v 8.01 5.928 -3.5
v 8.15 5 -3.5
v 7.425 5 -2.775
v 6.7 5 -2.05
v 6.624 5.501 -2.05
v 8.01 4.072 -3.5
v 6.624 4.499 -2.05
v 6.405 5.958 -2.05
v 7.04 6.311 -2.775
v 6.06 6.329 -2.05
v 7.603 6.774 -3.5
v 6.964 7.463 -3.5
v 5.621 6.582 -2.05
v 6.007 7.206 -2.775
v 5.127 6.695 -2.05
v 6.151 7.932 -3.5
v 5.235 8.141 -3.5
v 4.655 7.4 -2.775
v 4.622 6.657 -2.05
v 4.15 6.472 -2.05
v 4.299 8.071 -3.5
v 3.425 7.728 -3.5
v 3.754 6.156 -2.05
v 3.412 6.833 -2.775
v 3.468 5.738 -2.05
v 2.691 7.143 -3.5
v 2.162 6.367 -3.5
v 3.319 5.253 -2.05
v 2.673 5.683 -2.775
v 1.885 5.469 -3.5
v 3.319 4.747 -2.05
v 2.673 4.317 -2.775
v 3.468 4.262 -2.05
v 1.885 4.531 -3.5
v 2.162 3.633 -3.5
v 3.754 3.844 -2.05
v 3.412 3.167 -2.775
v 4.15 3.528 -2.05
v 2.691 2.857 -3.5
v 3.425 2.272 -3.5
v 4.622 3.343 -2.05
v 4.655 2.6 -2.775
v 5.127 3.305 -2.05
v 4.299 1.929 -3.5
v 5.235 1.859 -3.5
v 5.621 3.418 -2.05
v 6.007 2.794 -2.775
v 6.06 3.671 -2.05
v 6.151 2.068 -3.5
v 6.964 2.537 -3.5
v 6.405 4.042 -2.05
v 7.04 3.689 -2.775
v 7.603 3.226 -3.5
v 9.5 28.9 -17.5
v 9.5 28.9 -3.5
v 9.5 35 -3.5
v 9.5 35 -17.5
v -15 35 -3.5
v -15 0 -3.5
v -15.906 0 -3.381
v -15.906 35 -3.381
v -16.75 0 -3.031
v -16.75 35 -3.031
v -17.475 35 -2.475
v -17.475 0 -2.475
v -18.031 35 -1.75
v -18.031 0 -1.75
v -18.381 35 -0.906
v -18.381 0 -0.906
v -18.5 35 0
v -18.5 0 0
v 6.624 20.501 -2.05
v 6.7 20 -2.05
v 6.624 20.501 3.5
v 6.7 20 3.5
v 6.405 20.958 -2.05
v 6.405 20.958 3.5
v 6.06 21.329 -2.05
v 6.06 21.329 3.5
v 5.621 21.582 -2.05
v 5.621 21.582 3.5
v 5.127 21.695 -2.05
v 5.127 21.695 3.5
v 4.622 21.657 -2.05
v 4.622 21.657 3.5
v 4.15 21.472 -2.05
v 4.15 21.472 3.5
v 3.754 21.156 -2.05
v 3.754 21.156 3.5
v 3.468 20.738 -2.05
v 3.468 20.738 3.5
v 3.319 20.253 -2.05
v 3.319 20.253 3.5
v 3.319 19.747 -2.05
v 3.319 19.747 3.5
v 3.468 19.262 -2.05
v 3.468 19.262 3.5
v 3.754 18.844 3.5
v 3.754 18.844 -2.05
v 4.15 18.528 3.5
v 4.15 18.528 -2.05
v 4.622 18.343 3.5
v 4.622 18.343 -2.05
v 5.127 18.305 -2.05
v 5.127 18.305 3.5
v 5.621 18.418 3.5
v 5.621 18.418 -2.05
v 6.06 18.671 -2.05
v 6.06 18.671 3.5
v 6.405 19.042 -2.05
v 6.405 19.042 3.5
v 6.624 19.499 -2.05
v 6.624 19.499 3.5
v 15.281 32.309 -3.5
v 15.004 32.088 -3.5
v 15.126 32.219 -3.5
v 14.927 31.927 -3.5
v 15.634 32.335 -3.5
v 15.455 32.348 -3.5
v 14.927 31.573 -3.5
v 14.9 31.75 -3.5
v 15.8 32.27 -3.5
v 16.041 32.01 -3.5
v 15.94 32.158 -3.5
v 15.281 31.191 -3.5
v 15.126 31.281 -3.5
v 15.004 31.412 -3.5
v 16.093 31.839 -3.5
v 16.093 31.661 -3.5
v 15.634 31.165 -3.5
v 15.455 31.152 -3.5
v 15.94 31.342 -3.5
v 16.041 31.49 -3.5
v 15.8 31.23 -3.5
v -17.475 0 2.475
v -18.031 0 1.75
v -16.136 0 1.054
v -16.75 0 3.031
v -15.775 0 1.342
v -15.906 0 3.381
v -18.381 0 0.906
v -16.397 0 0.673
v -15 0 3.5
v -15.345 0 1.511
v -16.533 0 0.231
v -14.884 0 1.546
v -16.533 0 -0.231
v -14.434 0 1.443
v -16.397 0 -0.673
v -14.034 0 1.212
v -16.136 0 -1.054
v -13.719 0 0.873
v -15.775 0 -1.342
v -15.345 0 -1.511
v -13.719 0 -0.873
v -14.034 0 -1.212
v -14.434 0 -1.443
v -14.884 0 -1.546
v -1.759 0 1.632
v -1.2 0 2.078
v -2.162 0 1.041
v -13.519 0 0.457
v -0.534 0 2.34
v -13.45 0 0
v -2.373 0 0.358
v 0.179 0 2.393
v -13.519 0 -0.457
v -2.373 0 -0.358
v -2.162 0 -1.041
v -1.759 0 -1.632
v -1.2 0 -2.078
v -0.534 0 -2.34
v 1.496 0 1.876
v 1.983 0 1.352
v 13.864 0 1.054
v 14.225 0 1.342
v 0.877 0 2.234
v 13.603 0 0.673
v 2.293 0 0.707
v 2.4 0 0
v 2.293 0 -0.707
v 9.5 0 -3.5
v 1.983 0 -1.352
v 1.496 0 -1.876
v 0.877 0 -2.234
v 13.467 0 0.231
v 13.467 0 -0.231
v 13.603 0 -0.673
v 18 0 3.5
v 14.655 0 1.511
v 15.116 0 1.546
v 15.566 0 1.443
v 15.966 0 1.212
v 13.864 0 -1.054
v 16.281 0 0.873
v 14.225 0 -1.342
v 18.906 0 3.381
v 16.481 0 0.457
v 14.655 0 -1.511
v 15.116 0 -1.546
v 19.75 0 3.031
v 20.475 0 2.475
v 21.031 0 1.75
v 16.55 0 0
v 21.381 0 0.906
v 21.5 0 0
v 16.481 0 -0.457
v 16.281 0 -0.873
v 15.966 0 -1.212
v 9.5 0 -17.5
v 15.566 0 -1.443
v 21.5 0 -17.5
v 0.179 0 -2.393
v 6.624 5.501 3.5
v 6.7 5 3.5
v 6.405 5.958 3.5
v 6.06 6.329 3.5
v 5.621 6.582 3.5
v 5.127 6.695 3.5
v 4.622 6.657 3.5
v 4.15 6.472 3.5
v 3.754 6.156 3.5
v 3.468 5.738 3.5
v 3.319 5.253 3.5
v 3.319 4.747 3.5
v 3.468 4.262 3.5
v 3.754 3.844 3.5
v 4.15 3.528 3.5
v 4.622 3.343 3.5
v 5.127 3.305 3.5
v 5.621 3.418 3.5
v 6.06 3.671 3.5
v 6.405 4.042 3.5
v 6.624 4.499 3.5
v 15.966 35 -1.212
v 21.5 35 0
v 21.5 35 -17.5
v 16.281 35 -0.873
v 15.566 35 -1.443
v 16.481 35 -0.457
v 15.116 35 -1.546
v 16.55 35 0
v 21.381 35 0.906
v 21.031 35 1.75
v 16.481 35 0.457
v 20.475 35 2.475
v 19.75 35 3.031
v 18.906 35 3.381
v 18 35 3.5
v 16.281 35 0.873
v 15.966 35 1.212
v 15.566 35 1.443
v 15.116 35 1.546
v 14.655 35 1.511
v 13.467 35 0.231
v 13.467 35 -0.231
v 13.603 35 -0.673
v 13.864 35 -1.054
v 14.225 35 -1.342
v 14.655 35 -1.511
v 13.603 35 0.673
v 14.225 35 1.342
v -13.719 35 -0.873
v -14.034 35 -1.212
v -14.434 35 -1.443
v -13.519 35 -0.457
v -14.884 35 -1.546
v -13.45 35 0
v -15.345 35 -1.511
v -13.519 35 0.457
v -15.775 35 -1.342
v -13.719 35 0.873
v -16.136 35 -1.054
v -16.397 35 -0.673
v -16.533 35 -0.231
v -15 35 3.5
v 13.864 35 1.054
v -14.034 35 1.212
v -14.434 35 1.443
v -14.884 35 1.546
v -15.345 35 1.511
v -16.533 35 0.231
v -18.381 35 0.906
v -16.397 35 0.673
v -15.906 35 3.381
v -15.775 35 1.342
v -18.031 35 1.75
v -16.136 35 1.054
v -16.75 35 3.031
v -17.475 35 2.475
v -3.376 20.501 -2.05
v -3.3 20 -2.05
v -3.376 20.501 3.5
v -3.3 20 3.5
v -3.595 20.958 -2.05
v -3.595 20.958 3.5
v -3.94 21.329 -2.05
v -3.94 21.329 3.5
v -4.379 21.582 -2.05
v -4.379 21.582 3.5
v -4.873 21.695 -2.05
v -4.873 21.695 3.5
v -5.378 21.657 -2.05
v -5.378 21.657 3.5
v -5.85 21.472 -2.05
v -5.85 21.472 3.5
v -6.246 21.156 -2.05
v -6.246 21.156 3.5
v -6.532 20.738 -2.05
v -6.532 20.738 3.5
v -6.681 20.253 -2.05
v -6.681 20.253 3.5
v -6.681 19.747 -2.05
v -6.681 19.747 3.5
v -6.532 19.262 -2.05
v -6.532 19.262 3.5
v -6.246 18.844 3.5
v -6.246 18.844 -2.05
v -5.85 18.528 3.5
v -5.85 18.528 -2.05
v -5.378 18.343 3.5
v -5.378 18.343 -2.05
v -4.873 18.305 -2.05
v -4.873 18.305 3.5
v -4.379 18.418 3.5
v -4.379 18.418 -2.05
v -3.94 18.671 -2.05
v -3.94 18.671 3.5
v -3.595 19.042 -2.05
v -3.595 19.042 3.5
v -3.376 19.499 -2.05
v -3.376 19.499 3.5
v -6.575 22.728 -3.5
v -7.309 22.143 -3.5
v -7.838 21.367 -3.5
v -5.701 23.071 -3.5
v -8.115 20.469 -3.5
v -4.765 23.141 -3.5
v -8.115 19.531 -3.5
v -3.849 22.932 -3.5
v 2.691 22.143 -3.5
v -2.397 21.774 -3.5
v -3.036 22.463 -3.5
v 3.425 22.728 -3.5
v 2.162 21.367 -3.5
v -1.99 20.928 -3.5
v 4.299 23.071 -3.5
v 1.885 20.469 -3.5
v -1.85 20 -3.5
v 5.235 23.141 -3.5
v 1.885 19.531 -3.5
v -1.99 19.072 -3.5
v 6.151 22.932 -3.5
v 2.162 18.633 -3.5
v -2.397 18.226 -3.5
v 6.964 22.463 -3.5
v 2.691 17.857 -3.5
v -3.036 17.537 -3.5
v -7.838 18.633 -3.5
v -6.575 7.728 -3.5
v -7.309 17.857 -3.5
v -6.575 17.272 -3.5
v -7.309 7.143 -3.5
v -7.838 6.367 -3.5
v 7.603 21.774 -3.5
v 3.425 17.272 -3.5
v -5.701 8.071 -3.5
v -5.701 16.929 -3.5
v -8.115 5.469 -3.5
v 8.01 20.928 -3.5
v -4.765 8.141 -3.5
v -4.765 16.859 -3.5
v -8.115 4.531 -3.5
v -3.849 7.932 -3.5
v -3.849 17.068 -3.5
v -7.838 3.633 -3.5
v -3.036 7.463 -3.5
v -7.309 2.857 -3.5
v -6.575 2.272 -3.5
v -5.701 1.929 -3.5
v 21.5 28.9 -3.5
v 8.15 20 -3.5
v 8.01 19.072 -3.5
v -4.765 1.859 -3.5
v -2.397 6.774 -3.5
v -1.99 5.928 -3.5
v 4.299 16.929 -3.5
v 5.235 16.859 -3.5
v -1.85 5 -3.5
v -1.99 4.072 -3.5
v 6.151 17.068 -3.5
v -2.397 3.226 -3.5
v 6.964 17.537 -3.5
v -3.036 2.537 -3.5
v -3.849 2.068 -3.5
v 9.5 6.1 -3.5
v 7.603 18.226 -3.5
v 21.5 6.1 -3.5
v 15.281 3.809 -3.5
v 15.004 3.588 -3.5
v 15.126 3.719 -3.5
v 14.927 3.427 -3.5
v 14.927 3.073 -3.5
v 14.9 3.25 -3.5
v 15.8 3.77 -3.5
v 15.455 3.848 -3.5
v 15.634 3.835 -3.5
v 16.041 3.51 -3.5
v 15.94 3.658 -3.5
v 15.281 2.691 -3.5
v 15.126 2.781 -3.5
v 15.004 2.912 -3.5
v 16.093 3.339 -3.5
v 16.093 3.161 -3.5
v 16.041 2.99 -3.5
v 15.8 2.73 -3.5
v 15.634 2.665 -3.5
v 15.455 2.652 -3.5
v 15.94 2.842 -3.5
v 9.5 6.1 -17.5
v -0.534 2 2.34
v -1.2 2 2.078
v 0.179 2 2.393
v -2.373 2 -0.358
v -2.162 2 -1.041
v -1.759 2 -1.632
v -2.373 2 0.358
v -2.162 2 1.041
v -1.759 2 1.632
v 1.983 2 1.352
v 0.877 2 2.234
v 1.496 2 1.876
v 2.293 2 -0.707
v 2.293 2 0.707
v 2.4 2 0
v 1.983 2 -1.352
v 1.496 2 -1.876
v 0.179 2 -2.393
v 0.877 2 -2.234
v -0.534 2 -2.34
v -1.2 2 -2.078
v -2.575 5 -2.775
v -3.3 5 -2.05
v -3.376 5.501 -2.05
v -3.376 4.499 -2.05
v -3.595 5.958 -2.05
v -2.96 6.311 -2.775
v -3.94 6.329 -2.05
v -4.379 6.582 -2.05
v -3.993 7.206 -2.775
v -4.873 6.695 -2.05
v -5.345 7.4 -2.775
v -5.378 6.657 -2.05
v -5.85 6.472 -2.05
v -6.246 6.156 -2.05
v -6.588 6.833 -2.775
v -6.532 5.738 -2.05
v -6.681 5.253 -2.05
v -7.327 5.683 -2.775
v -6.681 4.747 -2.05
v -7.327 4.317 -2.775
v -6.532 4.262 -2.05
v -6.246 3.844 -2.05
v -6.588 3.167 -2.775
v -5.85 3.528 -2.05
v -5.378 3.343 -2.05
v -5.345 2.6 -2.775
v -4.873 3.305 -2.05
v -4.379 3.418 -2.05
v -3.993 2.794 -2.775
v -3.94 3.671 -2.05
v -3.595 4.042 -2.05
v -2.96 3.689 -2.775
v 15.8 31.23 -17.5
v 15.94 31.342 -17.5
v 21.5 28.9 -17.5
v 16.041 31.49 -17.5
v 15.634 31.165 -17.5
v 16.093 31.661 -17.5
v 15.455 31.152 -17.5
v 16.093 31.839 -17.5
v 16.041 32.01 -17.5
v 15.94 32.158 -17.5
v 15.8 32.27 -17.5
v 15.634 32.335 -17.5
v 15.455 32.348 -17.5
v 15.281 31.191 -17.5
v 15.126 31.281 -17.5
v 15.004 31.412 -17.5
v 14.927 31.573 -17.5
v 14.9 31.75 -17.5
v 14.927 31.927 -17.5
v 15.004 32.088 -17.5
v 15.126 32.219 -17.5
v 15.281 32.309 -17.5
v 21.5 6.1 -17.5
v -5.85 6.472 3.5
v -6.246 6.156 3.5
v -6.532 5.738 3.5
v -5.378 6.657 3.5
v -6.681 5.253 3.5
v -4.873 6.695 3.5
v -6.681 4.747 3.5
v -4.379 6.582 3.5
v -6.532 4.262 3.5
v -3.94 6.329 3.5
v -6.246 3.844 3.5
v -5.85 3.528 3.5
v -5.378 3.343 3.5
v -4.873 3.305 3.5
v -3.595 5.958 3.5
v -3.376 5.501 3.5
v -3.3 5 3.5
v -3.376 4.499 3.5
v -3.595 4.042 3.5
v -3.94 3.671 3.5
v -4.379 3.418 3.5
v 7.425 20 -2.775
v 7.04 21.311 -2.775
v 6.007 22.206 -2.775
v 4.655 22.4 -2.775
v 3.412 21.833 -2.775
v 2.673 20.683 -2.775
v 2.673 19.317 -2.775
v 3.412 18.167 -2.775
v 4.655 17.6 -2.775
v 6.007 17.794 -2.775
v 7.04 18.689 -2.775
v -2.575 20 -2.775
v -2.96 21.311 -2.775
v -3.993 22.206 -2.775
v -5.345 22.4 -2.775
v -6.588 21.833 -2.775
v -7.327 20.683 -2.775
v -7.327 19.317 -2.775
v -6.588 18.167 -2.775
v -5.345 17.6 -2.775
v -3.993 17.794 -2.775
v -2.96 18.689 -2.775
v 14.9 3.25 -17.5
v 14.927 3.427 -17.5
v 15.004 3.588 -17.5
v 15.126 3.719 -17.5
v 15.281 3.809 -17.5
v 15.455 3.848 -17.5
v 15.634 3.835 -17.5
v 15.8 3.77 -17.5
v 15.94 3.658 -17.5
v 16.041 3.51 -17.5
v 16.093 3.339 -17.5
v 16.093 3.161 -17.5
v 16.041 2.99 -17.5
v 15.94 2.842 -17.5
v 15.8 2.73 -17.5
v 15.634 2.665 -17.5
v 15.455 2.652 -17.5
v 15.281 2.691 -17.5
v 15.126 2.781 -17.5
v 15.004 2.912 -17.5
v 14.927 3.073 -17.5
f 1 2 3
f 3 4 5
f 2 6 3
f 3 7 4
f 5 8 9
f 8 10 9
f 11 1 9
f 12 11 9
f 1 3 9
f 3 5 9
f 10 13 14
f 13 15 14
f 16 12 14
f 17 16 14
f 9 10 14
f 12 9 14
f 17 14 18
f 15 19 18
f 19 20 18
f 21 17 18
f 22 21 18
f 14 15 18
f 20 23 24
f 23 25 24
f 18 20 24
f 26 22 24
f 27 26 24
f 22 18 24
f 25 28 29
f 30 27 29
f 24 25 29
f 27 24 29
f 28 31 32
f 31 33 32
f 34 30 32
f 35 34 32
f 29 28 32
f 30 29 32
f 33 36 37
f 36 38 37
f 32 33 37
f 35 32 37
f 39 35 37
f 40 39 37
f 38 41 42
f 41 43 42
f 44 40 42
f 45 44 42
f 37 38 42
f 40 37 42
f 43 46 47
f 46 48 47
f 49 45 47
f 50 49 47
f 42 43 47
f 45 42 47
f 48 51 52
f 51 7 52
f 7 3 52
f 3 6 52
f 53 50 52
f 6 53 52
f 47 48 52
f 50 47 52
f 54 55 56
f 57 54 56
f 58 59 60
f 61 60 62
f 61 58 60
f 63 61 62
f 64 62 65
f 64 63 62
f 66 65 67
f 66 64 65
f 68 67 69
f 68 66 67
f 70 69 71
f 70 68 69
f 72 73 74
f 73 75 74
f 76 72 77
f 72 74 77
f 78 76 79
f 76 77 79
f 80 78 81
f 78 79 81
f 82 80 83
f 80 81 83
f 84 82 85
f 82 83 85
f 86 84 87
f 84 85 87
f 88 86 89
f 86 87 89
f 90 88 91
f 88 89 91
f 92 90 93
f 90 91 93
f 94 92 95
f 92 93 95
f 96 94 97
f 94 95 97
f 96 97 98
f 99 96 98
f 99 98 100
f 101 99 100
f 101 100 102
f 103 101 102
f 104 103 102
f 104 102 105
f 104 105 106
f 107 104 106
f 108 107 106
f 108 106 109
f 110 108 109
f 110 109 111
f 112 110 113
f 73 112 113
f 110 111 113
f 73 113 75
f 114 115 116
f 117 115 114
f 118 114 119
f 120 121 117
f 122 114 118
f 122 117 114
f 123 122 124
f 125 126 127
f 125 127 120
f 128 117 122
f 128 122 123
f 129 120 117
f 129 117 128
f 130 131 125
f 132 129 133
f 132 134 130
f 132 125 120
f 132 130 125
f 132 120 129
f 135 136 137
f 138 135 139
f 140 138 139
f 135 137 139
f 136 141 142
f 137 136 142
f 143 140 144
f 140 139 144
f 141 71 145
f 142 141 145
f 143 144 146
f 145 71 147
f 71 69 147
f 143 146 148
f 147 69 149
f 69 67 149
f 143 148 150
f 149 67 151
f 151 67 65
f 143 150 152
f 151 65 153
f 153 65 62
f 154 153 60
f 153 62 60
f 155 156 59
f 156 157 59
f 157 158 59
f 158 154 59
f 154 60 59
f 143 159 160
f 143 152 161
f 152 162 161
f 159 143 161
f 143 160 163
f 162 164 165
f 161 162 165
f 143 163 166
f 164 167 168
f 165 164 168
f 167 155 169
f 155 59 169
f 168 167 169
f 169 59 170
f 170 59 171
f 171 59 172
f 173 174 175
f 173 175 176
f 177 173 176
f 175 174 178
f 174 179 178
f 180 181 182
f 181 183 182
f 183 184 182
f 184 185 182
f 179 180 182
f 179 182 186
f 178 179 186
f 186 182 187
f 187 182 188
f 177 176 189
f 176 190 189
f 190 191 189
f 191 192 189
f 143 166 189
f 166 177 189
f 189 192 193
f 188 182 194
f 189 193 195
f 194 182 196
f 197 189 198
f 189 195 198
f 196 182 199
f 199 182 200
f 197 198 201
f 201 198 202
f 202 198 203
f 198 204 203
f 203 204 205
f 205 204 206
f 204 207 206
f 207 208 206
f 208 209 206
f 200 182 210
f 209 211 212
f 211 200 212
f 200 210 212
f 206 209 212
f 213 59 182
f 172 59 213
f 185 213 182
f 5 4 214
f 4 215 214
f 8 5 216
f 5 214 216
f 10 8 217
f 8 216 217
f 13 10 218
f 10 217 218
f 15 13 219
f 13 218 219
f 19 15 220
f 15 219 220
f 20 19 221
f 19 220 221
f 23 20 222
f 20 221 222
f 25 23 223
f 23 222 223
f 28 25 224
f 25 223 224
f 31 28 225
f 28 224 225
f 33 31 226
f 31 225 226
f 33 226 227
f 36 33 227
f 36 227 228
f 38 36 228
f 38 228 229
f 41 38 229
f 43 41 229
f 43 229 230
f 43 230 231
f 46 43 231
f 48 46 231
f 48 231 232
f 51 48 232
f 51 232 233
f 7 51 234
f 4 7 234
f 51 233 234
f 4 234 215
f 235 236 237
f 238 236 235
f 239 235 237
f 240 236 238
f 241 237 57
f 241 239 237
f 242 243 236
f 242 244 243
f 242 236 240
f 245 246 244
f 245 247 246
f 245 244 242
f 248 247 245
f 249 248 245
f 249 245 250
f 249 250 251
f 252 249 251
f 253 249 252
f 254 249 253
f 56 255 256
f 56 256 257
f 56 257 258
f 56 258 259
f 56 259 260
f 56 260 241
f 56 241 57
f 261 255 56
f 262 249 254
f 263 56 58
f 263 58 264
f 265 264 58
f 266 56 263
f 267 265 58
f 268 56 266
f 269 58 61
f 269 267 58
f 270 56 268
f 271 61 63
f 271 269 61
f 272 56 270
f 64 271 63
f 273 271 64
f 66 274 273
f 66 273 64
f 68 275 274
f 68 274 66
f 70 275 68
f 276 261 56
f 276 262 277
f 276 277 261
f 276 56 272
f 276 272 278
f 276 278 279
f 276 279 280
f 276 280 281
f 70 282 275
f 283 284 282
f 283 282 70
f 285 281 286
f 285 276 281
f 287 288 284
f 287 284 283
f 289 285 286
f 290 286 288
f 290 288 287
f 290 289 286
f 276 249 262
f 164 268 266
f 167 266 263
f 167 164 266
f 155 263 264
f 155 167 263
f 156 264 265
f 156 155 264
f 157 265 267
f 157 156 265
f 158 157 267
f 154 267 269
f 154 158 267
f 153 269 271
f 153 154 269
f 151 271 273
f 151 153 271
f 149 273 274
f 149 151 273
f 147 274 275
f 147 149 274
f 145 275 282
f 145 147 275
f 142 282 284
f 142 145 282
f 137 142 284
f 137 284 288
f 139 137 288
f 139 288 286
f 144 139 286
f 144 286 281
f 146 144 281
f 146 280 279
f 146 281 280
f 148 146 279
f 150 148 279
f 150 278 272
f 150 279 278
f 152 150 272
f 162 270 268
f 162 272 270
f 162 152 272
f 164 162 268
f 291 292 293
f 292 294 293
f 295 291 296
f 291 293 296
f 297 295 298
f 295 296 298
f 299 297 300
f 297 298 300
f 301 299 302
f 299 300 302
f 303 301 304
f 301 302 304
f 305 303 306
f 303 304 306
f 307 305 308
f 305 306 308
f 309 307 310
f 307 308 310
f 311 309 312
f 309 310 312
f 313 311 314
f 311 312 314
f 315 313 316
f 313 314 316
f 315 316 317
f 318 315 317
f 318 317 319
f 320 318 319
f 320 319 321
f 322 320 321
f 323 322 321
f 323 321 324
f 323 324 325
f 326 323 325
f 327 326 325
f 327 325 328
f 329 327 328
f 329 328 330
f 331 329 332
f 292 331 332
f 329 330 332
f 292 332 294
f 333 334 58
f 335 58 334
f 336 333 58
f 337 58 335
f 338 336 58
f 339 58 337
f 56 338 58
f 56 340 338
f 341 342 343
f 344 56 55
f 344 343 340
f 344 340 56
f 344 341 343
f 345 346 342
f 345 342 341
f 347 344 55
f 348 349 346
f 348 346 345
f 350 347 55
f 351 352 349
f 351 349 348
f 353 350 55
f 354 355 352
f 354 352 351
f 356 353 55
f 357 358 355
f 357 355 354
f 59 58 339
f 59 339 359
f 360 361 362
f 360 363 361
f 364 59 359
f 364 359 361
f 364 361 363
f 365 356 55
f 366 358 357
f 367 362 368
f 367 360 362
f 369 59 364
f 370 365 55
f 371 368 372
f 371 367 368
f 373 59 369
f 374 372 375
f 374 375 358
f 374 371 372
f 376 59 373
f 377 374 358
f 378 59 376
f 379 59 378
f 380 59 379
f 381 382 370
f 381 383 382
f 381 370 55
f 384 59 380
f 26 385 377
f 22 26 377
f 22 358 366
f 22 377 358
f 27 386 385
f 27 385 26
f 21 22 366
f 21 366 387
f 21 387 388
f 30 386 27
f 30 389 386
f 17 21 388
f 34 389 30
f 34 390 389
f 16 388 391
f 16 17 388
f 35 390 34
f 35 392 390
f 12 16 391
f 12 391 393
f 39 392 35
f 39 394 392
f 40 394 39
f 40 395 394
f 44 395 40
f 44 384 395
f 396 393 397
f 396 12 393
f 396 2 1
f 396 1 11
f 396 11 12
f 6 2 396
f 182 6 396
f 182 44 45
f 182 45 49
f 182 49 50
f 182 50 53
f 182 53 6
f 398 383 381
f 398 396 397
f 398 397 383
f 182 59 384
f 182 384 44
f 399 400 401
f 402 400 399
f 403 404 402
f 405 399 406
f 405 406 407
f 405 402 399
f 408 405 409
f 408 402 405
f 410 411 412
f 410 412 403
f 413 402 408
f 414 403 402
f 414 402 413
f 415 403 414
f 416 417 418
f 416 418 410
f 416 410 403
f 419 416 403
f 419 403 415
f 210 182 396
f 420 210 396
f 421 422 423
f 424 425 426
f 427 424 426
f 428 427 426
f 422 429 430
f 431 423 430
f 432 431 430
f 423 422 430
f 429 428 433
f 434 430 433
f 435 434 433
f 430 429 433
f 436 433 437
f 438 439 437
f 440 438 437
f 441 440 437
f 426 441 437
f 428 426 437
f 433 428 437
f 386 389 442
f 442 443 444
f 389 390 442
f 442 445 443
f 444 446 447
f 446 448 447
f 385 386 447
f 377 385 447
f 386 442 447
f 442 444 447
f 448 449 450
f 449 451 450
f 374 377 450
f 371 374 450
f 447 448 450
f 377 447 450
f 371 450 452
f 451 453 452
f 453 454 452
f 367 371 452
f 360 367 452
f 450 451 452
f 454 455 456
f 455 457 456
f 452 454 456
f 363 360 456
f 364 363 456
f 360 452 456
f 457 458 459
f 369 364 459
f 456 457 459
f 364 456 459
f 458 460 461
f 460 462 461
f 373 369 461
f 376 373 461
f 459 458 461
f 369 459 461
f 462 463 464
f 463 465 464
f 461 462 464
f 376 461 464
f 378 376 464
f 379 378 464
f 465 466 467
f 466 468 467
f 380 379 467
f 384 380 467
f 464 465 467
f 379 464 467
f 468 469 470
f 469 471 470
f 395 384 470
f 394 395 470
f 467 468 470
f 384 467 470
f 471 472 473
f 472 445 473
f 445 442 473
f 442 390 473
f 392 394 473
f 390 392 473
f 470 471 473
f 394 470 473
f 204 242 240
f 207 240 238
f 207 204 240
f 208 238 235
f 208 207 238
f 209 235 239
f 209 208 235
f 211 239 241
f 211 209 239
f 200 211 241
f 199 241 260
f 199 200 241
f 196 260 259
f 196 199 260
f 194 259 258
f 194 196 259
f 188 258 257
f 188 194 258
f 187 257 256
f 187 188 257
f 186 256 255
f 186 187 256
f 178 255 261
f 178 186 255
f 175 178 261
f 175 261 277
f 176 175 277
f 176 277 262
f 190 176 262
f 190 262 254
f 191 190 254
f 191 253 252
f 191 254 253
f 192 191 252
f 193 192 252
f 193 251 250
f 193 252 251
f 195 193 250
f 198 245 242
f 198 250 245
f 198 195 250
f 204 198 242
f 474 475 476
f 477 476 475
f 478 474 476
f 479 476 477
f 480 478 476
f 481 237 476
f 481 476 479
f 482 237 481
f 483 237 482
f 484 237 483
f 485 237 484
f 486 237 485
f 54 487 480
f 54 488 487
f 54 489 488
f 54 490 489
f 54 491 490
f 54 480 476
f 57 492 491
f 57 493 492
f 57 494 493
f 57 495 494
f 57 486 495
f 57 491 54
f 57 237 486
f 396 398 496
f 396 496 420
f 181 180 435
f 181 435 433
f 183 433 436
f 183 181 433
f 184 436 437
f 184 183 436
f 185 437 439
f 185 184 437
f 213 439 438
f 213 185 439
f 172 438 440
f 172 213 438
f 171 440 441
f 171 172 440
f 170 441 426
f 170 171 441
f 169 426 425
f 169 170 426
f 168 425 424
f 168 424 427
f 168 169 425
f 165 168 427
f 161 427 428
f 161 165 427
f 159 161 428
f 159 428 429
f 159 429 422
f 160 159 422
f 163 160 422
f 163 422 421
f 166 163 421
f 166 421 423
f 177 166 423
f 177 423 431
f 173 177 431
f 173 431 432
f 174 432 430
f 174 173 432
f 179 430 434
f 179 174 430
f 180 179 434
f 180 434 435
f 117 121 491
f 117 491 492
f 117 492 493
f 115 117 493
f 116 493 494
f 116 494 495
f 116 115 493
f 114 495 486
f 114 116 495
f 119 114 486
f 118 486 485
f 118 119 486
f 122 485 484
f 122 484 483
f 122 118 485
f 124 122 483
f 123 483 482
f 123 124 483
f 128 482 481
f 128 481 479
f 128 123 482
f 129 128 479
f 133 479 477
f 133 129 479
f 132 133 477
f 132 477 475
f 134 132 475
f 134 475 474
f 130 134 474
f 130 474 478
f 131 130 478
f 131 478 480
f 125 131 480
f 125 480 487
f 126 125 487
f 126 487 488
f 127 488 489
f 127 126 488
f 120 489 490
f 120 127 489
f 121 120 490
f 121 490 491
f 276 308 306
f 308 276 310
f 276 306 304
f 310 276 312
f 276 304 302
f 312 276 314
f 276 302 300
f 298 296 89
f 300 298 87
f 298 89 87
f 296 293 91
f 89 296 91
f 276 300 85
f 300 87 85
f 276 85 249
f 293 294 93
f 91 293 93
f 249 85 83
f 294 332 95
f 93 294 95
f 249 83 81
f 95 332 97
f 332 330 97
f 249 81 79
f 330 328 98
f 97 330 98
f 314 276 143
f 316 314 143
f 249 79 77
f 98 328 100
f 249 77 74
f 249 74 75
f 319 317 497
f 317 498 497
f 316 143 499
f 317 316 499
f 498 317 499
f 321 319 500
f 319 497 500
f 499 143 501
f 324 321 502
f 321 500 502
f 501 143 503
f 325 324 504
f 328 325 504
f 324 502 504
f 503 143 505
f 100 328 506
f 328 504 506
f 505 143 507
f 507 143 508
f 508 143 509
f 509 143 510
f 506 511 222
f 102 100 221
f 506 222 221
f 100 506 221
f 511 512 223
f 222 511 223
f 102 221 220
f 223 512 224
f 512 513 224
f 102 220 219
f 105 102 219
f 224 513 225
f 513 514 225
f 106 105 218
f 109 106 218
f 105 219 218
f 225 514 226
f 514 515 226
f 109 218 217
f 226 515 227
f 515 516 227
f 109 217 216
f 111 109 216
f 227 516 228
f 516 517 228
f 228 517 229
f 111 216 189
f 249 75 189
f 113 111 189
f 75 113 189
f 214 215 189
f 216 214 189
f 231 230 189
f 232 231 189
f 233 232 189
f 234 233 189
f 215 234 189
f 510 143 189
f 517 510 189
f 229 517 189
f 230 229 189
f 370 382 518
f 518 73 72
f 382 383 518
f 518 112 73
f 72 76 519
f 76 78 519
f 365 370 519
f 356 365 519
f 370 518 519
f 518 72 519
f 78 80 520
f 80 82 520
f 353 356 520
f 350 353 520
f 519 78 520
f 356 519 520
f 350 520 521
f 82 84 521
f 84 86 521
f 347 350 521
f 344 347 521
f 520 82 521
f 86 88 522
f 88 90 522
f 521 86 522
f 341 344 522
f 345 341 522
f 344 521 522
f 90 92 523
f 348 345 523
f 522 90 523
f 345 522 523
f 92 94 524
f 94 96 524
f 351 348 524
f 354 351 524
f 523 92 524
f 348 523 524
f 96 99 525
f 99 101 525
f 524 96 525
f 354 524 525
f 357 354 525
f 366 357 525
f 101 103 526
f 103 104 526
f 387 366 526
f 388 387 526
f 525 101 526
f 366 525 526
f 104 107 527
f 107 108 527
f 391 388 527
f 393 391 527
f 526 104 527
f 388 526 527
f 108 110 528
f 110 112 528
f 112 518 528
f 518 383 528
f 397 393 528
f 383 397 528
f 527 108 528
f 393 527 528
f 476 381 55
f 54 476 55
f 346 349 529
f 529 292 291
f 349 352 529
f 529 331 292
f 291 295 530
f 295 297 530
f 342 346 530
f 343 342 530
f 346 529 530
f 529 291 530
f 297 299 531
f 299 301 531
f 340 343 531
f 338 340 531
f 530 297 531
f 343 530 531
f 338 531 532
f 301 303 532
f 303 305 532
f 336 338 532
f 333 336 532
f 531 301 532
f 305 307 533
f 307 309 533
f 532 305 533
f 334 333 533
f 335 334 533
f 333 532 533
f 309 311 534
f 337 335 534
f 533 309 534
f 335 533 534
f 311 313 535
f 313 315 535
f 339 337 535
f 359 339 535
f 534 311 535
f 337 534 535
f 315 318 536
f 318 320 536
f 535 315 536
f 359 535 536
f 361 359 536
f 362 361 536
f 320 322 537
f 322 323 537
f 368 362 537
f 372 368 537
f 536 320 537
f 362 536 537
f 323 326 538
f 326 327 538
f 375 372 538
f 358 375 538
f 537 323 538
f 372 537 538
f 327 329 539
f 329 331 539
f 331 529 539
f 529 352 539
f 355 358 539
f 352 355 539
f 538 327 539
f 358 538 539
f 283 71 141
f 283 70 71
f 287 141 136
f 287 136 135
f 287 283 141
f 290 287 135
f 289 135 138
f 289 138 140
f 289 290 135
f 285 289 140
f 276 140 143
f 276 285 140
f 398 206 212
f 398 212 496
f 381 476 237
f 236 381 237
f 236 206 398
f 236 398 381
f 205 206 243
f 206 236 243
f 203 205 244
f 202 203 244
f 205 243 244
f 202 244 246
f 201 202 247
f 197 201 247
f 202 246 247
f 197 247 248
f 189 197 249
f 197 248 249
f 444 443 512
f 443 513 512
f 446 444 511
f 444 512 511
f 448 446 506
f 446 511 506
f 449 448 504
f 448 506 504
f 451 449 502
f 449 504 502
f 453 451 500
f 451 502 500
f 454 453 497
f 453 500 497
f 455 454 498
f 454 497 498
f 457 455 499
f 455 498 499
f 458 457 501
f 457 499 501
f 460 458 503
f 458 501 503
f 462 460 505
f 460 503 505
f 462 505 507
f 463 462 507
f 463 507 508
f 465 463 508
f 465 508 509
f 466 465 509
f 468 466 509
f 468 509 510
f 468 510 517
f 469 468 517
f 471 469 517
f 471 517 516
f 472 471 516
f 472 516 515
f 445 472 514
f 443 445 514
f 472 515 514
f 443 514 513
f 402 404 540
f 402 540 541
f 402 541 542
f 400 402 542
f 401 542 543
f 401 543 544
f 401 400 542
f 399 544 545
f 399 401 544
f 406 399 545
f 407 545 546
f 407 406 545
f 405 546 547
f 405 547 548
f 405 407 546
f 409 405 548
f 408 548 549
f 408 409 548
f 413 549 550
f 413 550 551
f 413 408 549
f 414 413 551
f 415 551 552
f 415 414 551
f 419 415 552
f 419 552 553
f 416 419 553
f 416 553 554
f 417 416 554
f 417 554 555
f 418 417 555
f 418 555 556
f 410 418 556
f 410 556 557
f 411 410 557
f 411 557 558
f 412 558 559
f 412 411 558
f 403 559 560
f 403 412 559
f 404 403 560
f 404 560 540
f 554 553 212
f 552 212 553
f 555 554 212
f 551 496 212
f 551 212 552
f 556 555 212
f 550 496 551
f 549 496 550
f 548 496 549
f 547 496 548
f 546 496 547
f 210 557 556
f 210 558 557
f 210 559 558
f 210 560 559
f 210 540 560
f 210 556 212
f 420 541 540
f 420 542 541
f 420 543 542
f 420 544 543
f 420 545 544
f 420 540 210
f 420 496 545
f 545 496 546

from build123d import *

# Parameters (mm, degrees)
SKIZZE1_W                                            = 40
SKIZZE1_H                                            = 7
AUFSATZ_LINEAR_AUSTRAGEN1_DEPTH                      = 35
SKIZZE2_W                                            = 12
SKIZZE2_H                                            = 6.1
SKIZZE2_R                                            = 0.6
AUFSATZ_LINEAR_AUSTRAGEN2_DEPTH                      = 14
FORMSENKUNG_F_R_M3_SENKSCHRAUBE_MIT_SCHL_D           = 3.4
FORMSENKUNG_F_R_M3_SENKSCHRAUBE_MIT_SCHL_CSINK_D     = 6.3
FORMSENKUNG_F_R_M3_SENKSCHRAUBE_MIT_SCHL_CSINK_ANGLE = 90
VERRUNDUNG1_R                                        = 3.5
SCHNITT_LINEAR_AUSTRAGEN1_DEPTH                      = 45.648628198
SCHNITT_LINEAR_AUSTRAGEN2_DEPTH                      = 2


with BuildPart() as part:
    # Skizze1 → Aufsatz-Linear austragen1 (new body)
    with BuildSketch(Plane(origin=(0, 0, 0), x_dir=(1, 0, 0), z_dir=(0, 1, 0))):
        with Locations((1.5, 0)):
            Rectangle(SKIZZE1_W, SKIZZE1_H)
    extrude(amount=AUFSATZ_LINEAR_AUSTRAGEN1_DEPTH)

    # Skizze2 → Aufsatz-Linear austragen2 (add)
    # profile 1 of 2: a face of its own
    with BuildSketch(Plane(origin=(0, 0, -3.5), x_dir=(-1, 0, 0), z_dir=(0, 0, -1))):
        with Locations((-15.5, 31.95)):
            Rectangle(SKIZZE2_W, SKIZZE2_H)
        with Locations((-15.5, 31.75)):
            Circle(SKIZZE2_R, mode=Mode.SUBTRACT)
    # profile 2 of 2: a face of its own
    with BuildSketch(Plane(origin=(0, 0, -3.5), x_dir=(-1, 0, 0), z_dir=(0, 0, -1))):
        with Locations((-15.5, 3.05)):
            Rectangle(SKIZZE2_W, SKIZZE2_H)
        with Locations((-15.5, 3.25)):
            Circle(SKIZZE2_R, mode=Mode.SUBTRACT)
    extrude(amount=AUFSATZ_LINEAR_AUSTRAGEN2_DEPTH)

    # Formsenkung für M3 Senkschraube mit Schlitz/Kreuzschlitz1 (through all)
    with Locations(Plane(origin=(0, 0, -3.5), x_dir=(-1, 0, 0), z_dir=(0, 0, -1))):
        with Locations((-5, 20), (5, 20), (5, 5), (-5, 5)):
            CounterSinkHole(FORMSENKUNG_F_R_M3_SENKSCHRAUBE_MIT_SCHL_D / 2, FORMSENKUNG_F_R_M3_SENKSCHRAUBE_MIT_SCHL_CSINK_D / 2, counter_sink_angle=FORMSENKUNG_F_R_M3_SENKSCHRAUBE_MIT_SCHL_CSINK_ANGLE)

    # Verrundung1
    verrundung1_edges = [part.edges().sort_by_distance(p)[0] for p in [
        (21.5, 17.5, 3.5),
        (-18.5, 17.5, 3.5),
        (-18.5, 17.5, -3.5),
    ]]
    fillet(verrundung1_edges, radius=VERRUNDUNG1_R - 0.0001)  # a hair under: the kernel refuses the full size

    # Skizze1<5> → Schnitt-Linear austragen1 (cut, through all)
    with BuildSketch(Plane(origin=(0, 0, 0), x_dir=(1, 0, 0), z_dir=(0, 1, 0))):
        with BuildLine():
            ThreePointArc((13.45, 0), (15, -1.55), (16.55, 0))
            Line((16.55, 0), (13.45, 0))
        make_face()
        with BuildLine():
            Line((13.45, 0), (16.55, 0))
            ThreePointArc((16.55, 0), (15, 1.55), (13.45, 0))
        make_face()
        with BuildLine():
            ThreePointArc((-16.55, 0), (-15, -1.55), (-13.45, 0))
            Line((-13.45, 0), (-16.55, 0))
        make_face()
        with BuildLine():
            Line((-16.55, 0), (-13.45, 0))
            ThreePointArc((-13.45, 0), (-15, 1.55), (-16.55, 0))
        make_face()
    extrude(amount=SCHNITT_LINEAR_AUSTRAGEN1_DEPTH, mode=Mode.SUBTRACT)

    # Skizze1<7> → Schnitt-Linear austragen2 (cut)
    with BuildSketch(Plane(origin=(0, 0, 0), x_dir=(1, 0, 0), z_dir=(0, 1, 0))):
        with BuildLine():
            ThreePointArc((-2.4, 0), (0, -2.4), (2.4, 0))
            Line((2.4, 0), (-2.4, 0))
        make_face()
        with BuildLine():
            Line((-2.4, 0), (2.4, 0))
            ThreePointArc((2.4, 0), (0, 2.4), (-2.4, 0))
        make_face()
    extrude(amount=SCHNITT_LINEAR_AUSTRAGEN2_DEPTH, mode=Mode.SUBTRACT)


solid = part.part
